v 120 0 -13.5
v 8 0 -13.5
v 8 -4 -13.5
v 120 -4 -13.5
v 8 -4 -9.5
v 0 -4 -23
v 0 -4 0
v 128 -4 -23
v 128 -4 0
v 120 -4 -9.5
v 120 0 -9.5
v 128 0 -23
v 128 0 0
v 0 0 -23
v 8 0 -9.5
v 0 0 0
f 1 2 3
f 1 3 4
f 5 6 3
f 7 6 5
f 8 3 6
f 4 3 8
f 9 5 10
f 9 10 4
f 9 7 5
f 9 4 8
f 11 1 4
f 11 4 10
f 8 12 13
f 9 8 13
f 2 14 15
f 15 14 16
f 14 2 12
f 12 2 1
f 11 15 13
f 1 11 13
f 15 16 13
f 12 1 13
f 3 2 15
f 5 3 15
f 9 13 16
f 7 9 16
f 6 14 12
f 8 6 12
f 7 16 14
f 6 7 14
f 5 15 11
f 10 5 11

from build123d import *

# Parameters (mm, degrees)
F0_W     = 112
F0_H     = 4
F1_DEPTH = 4


with BuildPart() as f1:
    # F0 (on Front) → F1 (new body)
    with BuildSketch(Plane.XZ):
        Polygon((128, 0), (0, 0), (0, -23), (128, -23), (128, -13.5), (128, -11.5), (128, -9.5), align=None)
        with Locations((64, -11.5)):
            Rectangle(F0_W, F0_H, mode=Mode.SUBTRACT)
    extrude(amount=F1_DEPTH)


solid = f1.part
